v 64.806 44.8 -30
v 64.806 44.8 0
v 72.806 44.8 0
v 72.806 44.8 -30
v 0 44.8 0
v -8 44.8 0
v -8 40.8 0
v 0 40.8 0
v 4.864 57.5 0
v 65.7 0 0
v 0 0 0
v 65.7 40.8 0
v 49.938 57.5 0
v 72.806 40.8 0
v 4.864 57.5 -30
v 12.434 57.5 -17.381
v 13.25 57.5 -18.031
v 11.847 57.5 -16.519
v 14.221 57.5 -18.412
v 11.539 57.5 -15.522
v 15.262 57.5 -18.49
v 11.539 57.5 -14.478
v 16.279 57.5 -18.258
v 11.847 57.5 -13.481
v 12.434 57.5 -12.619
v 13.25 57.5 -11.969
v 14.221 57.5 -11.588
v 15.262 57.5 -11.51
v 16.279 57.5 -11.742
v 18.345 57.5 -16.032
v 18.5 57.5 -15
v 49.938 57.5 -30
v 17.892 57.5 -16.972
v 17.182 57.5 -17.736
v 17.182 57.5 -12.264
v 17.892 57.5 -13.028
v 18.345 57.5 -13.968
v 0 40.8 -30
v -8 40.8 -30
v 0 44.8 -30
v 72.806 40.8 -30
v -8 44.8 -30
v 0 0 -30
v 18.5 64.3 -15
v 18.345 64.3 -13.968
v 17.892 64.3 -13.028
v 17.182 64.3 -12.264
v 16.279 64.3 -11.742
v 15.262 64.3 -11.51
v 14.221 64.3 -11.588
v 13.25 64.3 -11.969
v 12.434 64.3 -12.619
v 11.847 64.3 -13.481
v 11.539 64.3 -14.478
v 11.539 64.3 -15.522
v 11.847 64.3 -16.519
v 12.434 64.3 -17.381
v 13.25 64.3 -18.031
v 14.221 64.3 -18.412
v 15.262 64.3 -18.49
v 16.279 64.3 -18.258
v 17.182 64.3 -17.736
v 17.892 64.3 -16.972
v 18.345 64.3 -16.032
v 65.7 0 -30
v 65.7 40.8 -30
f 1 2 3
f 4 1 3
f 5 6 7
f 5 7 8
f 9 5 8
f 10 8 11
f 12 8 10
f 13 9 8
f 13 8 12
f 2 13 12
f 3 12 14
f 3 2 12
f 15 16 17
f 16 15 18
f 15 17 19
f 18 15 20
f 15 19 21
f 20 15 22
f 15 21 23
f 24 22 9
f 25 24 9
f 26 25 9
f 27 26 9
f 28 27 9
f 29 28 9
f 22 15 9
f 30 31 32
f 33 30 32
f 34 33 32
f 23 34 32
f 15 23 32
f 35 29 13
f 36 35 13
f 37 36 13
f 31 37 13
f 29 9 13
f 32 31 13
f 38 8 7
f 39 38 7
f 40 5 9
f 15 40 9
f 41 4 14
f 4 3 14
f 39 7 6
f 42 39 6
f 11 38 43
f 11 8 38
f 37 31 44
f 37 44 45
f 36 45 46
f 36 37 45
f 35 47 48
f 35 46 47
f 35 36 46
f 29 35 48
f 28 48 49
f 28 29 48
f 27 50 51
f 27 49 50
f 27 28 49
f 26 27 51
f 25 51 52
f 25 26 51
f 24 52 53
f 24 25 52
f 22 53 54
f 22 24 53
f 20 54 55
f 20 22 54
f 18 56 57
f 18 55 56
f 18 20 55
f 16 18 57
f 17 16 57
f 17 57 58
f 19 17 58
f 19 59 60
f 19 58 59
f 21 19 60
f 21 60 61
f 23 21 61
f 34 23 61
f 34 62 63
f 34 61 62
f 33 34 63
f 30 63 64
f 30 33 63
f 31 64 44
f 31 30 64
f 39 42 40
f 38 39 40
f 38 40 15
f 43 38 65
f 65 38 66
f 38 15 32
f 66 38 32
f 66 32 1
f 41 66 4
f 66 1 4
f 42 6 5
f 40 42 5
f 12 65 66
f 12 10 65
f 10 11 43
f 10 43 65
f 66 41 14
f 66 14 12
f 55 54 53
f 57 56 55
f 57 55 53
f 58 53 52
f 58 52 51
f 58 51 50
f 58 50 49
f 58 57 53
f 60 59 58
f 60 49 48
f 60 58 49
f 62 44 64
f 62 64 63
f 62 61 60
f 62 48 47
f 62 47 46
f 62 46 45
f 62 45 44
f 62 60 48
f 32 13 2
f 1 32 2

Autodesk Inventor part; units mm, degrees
ref_plane "YZ Plane" through (0, 0, 0) normal (1, 0, 0) x (0, 1, 0)
ref_plane "XZ Plane" through (0, 0, 0) normal (0, 1, 0) x (-1, 0, 0)
ref_plane "XY Plane" through (0, 0, 0) normal (0, 0, 1) x (1, 0, 0)
sketch "Sketch1" plane through (0, 0, 0) normal (0, 0, 1) x (1, 0, 0)
  line L0 (0, 0) -> (65.7, 0)
  line L1 (65.7, 0) -> (65.7, 40.8)
  line L2 (0, 40.8) -> (0, 0)
  line L3 (0, 40.8) -> (-8, 40.8)
  line L4 (-8, 40.8) -> (-8, 44.8)
  line L5 (-8, 44.8) -> (0, 44.8)
  line L6 (0, 44.8) -> (4.8644, 57.5)
  line L7 (4.8644, 57.5) -> (49.9378, 57.5)
  line L8 (49.9378, 57.5) -> (64.8064, 44.8)
  line L9 (64.8064, 44.8) -> (72.8064, 44.8)
  line L10 (72.8064, 44.8) -> (72.8064, 40.8)
  line L11 (72.8064, 40.8) -> (65.7, 40.8)
  dimension "d0" = 65.7
  dimension "d1" = 40.8
  dimension "d2" = 4
  dimension "d9" = 57.5
  dimension "d13" = 8
  dimension "d14" = 8
extrude "Extrusion1" add sketch "Sketch1" against normal blind 30
sketch "Sketch2" plane through (4.8644, 57.5, 0) normal (0, 1, 0) x (1, 0, 0)
  circle A0 centre (10.1356, 15) radius 3.5
  line L0 (-12.8644, 30) -> (-4.8644, 30) projected
  point P0 (-4.8644, 0)
  dimension "d5" = 7
  dimension "d6" = 15
  dimension "d7" = 15
extrude "Extrusion2" add sketch "Sketch2" along normal blind 6.8
properties part number "servo60"
